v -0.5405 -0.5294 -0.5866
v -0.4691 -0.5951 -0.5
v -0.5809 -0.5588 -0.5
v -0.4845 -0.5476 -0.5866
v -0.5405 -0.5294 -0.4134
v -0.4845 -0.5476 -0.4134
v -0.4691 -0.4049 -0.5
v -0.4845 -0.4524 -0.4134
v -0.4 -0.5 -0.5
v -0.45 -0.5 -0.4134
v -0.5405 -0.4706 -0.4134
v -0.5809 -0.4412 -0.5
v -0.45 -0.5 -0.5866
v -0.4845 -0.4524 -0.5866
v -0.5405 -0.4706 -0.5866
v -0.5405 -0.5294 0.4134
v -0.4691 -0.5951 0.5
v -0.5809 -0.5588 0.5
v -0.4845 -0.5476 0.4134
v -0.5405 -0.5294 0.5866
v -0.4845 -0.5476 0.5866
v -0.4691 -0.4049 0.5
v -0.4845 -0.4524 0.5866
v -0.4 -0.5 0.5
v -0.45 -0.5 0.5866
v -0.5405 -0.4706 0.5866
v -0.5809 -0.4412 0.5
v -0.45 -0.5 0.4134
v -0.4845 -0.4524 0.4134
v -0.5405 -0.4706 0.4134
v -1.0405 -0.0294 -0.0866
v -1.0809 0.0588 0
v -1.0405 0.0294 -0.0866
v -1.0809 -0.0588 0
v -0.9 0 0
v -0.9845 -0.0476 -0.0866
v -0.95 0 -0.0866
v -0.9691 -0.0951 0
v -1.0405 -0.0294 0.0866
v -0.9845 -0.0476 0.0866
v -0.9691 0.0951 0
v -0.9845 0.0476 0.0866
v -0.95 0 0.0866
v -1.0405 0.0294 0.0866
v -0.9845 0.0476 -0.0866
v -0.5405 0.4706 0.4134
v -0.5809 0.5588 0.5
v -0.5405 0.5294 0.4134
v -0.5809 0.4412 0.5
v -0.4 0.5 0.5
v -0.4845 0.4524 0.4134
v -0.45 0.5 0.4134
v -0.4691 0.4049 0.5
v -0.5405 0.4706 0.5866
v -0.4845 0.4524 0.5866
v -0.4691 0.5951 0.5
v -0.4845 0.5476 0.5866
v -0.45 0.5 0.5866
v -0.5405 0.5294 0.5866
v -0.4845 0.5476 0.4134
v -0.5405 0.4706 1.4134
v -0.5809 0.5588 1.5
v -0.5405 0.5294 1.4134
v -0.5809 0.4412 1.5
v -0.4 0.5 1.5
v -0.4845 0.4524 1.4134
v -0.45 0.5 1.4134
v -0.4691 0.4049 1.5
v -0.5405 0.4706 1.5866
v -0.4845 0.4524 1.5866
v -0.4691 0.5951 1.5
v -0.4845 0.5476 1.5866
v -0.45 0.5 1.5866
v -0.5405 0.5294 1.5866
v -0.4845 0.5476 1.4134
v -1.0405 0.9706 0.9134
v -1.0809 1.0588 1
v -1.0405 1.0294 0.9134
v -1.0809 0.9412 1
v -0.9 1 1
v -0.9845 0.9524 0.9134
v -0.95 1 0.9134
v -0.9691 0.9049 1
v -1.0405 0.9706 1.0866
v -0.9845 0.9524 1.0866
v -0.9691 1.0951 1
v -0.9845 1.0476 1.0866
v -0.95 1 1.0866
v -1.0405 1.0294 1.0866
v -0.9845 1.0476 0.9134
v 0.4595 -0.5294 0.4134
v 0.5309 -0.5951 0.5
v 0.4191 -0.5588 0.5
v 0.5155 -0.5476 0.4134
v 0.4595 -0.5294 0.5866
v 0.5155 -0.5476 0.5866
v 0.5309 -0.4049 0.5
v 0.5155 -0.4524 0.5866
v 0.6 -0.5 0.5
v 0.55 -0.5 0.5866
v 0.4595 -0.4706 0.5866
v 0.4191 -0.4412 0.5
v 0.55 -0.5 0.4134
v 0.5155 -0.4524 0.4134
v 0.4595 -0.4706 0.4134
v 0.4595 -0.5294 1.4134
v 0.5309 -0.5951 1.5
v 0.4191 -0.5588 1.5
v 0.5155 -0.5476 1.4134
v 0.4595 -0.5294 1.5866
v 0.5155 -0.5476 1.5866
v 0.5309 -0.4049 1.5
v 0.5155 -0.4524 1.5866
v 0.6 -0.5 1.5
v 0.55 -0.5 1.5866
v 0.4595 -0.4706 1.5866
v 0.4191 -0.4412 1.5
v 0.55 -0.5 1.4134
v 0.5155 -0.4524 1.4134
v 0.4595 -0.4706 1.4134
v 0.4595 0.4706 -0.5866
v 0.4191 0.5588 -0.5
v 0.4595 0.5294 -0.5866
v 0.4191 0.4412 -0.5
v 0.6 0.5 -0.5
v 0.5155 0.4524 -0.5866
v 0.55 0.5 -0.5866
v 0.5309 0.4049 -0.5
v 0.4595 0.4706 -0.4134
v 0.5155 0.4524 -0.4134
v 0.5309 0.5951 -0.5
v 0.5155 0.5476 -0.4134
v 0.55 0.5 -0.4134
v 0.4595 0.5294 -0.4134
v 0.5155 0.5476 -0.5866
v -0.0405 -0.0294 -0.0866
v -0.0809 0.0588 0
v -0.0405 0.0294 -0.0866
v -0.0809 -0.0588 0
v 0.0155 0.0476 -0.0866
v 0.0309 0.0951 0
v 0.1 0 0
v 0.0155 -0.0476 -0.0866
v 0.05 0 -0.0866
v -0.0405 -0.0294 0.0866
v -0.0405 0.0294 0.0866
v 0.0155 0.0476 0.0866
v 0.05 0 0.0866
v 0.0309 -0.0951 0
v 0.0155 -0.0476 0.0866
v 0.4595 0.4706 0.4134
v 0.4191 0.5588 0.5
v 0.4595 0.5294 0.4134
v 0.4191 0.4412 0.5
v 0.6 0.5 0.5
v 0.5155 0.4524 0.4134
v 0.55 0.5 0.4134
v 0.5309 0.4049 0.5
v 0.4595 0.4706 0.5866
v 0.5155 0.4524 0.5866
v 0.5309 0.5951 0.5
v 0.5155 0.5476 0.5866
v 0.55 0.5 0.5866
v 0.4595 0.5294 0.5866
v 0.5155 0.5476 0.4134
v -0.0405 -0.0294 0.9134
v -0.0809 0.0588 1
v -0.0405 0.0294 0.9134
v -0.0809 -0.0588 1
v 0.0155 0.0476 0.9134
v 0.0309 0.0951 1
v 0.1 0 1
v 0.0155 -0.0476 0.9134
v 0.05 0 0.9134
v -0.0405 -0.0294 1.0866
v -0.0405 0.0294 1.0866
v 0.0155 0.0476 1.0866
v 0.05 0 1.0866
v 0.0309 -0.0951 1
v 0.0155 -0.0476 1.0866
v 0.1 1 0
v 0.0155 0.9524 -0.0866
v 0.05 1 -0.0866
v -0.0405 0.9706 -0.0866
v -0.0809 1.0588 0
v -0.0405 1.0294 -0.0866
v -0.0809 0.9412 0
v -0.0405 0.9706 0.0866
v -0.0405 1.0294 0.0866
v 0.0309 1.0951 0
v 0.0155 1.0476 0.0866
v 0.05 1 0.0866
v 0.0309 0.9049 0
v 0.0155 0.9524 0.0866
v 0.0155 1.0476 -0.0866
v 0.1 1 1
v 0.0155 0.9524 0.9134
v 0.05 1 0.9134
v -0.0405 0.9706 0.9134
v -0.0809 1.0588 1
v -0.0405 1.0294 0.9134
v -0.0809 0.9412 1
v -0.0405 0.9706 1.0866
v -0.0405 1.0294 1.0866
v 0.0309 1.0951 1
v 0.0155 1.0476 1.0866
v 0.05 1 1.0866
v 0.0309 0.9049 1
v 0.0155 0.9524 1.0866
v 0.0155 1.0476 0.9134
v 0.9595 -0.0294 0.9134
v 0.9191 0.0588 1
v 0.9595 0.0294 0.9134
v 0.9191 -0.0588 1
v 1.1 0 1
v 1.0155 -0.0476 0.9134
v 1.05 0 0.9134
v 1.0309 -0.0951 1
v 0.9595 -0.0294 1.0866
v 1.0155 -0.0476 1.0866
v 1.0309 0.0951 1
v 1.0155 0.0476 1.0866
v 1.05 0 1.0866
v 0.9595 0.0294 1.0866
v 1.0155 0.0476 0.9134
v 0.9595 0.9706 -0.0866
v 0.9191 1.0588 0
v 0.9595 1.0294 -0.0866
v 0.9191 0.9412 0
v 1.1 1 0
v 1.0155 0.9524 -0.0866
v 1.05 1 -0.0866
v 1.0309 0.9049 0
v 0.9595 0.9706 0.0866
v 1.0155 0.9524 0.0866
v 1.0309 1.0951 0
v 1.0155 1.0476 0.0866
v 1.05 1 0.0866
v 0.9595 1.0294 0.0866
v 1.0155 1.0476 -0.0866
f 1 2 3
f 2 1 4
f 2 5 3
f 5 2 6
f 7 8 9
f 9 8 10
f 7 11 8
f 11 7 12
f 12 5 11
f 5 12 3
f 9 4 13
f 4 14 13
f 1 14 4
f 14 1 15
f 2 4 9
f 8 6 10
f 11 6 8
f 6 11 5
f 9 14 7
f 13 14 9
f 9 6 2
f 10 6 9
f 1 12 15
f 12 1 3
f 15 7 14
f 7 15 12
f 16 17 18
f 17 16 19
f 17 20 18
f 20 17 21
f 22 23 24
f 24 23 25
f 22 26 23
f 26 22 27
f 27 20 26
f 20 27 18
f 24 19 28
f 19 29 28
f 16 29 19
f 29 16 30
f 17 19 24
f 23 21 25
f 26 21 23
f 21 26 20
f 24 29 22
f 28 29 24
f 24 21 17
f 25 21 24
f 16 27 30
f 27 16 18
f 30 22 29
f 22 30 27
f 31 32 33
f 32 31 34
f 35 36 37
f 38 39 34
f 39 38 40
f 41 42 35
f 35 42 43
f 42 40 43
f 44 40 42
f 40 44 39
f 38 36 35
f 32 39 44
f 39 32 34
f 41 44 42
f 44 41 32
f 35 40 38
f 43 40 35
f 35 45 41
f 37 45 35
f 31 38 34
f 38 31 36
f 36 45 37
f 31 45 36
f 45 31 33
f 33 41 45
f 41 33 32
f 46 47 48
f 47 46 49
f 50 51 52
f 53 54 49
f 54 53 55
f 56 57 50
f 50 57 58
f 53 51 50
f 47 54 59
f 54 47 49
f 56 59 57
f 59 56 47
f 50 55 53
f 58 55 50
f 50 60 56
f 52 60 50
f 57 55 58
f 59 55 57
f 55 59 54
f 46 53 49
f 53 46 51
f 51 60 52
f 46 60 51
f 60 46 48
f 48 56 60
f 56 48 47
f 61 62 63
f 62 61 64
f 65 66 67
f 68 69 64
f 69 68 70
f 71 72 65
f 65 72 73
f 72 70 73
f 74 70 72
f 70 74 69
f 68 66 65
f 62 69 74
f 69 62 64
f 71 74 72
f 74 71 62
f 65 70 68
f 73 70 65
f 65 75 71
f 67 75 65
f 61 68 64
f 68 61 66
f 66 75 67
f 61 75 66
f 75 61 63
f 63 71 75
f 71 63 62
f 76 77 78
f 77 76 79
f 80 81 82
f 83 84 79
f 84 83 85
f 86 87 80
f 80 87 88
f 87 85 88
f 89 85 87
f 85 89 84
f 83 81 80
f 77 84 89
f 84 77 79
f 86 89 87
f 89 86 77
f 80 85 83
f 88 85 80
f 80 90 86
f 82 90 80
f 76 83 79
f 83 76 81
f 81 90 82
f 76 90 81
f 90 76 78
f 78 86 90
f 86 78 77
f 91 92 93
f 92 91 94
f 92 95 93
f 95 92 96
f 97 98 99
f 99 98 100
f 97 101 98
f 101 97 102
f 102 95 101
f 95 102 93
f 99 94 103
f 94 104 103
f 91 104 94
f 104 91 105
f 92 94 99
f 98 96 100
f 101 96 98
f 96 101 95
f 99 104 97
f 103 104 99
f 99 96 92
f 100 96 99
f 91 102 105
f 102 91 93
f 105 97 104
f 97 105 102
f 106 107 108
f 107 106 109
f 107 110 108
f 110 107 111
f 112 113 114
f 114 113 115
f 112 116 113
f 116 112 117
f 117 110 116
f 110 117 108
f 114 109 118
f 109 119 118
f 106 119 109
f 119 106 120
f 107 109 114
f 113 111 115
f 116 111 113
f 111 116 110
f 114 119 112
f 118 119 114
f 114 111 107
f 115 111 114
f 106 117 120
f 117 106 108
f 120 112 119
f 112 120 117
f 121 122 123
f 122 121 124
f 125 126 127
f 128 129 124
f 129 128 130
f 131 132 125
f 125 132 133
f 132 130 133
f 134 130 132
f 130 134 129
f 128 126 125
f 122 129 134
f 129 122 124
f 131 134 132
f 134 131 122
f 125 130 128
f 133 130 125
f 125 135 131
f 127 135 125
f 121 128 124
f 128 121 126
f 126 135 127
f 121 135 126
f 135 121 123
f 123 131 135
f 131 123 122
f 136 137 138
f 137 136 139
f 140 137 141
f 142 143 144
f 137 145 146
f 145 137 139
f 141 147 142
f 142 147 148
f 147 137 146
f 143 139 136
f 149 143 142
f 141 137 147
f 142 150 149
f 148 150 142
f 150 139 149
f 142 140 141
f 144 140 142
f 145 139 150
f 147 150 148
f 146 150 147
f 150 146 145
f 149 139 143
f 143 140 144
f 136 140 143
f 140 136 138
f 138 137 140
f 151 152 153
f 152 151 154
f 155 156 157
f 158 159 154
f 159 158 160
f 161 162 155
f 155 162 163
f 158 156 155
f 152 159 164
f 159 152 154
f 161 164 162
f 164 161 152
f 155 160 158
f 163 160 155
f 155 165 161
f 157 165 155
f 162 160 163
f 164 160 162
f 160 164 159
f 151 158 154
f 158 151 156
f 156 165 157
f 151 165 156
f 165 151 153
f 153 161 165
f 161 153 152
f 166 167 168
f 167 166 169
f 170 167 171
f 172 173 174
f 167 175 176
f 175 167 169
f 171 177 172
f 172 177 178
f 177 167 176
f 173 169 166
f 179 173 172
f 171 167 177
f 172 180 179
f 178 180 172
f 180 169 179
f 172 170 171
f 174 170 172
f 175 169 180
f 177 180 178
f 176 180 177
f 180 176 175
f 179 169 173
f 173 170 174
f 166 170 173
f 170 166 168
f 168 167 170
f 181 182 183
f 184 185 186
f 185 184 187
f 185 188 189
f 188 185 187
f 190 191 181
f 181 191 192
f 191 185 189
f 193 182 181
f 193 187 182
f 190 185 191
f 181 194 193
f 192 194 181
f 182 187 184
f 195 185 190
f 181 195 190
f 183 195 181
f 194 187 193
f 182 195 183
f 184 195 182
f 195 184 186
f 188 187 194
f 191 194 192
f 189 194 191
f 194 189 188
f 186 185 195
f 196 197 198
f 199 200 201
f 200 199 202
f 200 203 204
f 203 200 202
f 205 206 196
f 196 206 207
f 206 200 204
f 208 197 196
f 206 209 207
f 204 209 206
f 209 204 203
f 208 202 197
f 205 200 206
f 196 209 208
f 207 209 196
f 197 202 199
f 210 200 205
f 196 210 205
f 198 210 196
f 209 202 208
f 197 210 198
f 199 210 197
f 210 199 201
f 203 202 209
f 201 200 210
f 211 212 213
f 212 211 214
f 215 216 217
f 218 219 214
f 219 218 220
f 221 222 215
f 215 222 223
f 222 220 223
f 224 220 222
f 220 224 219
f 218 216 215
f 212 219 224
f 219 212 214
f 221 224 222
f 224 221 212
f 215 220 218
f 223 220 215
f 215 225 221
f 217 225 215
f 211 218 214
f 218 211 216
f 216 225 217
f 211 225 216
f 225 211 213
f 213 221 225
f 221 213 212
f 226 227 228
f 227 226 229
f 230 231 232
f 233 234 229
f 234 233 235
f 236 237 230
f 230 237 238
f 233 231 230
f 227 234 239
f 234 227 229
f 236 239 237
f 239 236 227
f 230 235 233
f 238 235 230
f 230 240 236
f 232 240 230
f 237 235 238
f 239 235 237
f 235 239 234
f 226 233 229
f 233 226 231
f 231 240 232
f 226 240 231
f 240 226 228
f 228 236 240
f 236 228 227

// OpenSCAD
// file: 3d_tetrahedres.scad
use <lattice.scad>;

// Check if a vertex is adjacent to the central layer (that sets the size of processor).
// n as n_code in article (starts at 1).
function central_layer(x, z, n) = ((x+z == n-2) || (x+z == n-1)) ? true : false;

// Elementary tetrahedron as described in Equation (18) of arXiv:1311.0879.
// x, y, z : coordinates of vector x in arXiv:1311.0879
// s : +- 1
// permut : integer between 0 and 5 (included) that describe the permutation (a, b, c) :
//          0 : (a, b, c) = (i, j, k)
//          1 : (a, b, c) = (i, k, j)
//          2 : (a, b, c) = (j, i, k)
//          3 : (a, b, c) = (j, k, i)
//          4 : (a, b, c) = (k, i, j)
//          5 : (a, b, c) = (j, j, i)
// n : we keep only tetrahedron included in the code structure indexed by n.
//     n is as in Equation (19) of arXiv:1311.0879 (starts at 1).
//     use -1 for no filter
 module tetraedre (x, y, z, s, permut, n) {
     // if (permut==0) {xa=1; ya=0; za=0; xb=0; yb=1; zb=0; xc=0; yc=0; zc=1;}
     // if (permut==1) {xa=1; ya=0; za=0; xb=0; yb=0; zb=1; xc=0; yc=1; zc=0;}
     // if (permut==2) {xa=0; ya=1; za=0; xb=1; yb=0; zb=0; xc=0; yc=0; zc=1;}
     // if (permut==3) {xa=0; ya=1; za=0; xb=0; yb=0; zb=1; xc=1; yc=0; zc=0;}
     // if (permut==4) {xa=0; ya=0; za=1; xb=1; yb=0; zb=0; xc=0; yc=1; zc=0;}
     // if (permut==5) {xa=0; ya=0; za=1; xb=0; yb=1; zb=0; xc=1; yc=0; zc=0;}
     xa = permut==0 || permut==1 ? 1 : 0;
     ya = permut==2 || permut==3 ? 1 : 0;
     za = permut==4 || permut==5 ? 1 : 0;
     xb = permut==2 || permut==4 ? 1 : 0;
     yb = permut==0 || permut==5 ? 1 : 0;
     zb = permut==1 || permut==3 ? 1 : 0;
     xc = permut==3 || permut==5 ? 1 : 0;
     yc = permut==1 || permut==4 ? 1 : 0;
     zc = permut==0 || permut==2 ? 1 : 0;

     // Coordinates of vertices of the tetrahedron.
     x1=x; y1=y; z1=z;                                               // x
     x2=x+xa; y2=y+ya; z2=z+za;                                      // x + a
     x3=x+(xa+s*xb+xc)/2; y3=y+(ya+s*yb+yc)/2; z3=z+(za+s*zb+zc)/2;  // x + (a+sb+c)/2
     x4=x+(xa+s*xb-xc)/2; y4=y+(ya+s*yb-yc)/2; z4=z+(za+s*zb-zc)/2;  // x + (a+sb-c)/2

     if (n == -1 || (
         filtre(x1, y1, z1, n)
         && filtre(x2, y2, z2, n)
         && filtre(x3, y3, z3, n)
         && filtre(x4, y4, z4, n)
     )) {
         // echo(x, y, z, s, permut, n);
         if (central_layer(x1, z1, n)
             && central_layer(x2, z2, n)
             && central_layer(x3, z3, n)
             && central_layer(x4, z4, n))
            {
             echo("One central tetraedron");
             color("red")
             polyhedron(
                 points=[[x1,y1,z1], [x2,y2,z2], [x3,y3,z3], [x4,y4,z4]],
                 faces=[[0,1,2], [0,1,3], [0,2,3], [1,3,2]]
                );
            }
         else {
             polyhedron(
                 points=[[x1,y1,z1], [x2,y2,z2], [x3,y3,z3], [x4,y4,z4]],
                 faces=[[0,1,2], [0,1,3], [0,2,3], [1,3,2]]
                );
            }
        }
    }


n = 3;
grille(n);

for (x = [-1:n-1]) {
        for (y = [-1:n-1]) {
            for (z = [-1:n-1]) {
                for (s=[-1:2:1]) {
                    for (permut = [0:5]) {
                        tetraedre(x, y, z, s, permut, n);
                    }
                }
            }
        }
    }
// file: lattice.scad
// Centered cubic grid, as presented in Equation (18) from arXiv:1311.0879


//  Uncut centered cubic grid.
module maille(nb) {
    // Diameter of small balls
    rad = 0.1;
    for (x = [0:nb]) {
        for (y = [0:nb]) {
            for (z = [0:nb]) {
                type = abs((x + y + z) % 2);  // Correspond to color
                x2 = x+0.5; y2 = y+0.5; z2 = z+0.5;
                if (type == 0) {
                        color("red") translate([x, y, z]) sphere(rad);
                        color("blue") translate([x2, y2, z2]) sphere(rad);
                        }
                if (type == 1) {
                    color("green") translate([x, y, z]) sphere(rad);
                    color("yellow") translate([x2, y2, z2]) sphere(rad);
                    }
                }
            }
        }
    }



// Check Equation (19) of arXiv:1311.0879 (n stars at 1).
function filtre(x, y, z, n) = ((x+y+z <= 0 + 2*(n-1))
                               && (x-y-z <= 1/2)
                               && (-x+y-z <= 1)
                               && (-x-y+z <= 3/2)) ? true : false;


// Grid as presented in Equations (18) and (19) of arXiv:1311.0879.
// n : number n in Equation (19): index in the code family, starts at 1.
module grille(n) {
    // Diameter of small balls
    rad = 0.1;
    for (x = [-1:n-1]) {
        for (y = [-1:n-1]) {
            for (z = [-1:n-1]) {
                type = abs((x + y + z) % 2);  // Correspond to color
                if (filtre(x, y, z, n)) {
                    if (type == 0) {
                        color("red") translate([x, y, z]) sphere(rad);
                        }
                    if (type == 1) {
                        color("green") translate([x, y, z]) sphere(rad);
                        }
                    }
                x2 = x+0.5; y2 = y+0.5; z2 = z+0.5;
                if (filtre(x2, y2, z2, n)) {
                    if (type == 0) {
                        color("blue") translate([x2, y2, z2]) sphere(rad);
                        }
                    if (type == 1) {
                        color("yellow") translate([x2, y2, z2]) sphere(rad);
                        }
                    }
                }
            }
        }
    }

//maille(2);
grille(2);
// main file
use <lattice.scad>;
use <3d_tetrahedres.scad>;

// 1st layer : 2 qubit
color("black") tetraedre(-1, 0, 0, -1, 0, 2);
color("black") tetraedre(-1, 0, 0, 1, 1, 2);

// 2nd layer : 11 qubit
color("Chartreuse") tetraedre(0, 0, 0, -1, 5, 2);
color("Chartreuse") tetraedre(0, 0, 0, -1, 4, 2);
color("Chartreuse") tetraedre(0, 0, 0, 1, 5, 2);
color("Chartreuse") tetraedre(0, 0, 0, 1, 4, 2);
color("Chartreuse") tetraedre(0, 0, 0, 1, 3, 2);
color("Chartreuse") tetraedre(0, 0, 0, 1, 2, 2);
color("Chartreuse") tetraedre(0, 1, 0, -1, 0, 2);
color("Chartreuse") tetraedre(0, 0, 1, -1, 3, 2);
color("Chartreuse") tetraedre(0, 1, 0, -1, 5, 2);
color("Chartreuse") tetraedre(0, 0, 1, -1, 2, 2);
color("Chartreuse") tetraedre(-1, 1, 1, -1, 0, 2);

// 3rd layer : 2 qubits
color("Magenta") tetraedre(0, 0, 1, -1, 0, 2);
color("Magenta") tetraedre(0, 0, 1, -1, 1, 2);


grille(2);
